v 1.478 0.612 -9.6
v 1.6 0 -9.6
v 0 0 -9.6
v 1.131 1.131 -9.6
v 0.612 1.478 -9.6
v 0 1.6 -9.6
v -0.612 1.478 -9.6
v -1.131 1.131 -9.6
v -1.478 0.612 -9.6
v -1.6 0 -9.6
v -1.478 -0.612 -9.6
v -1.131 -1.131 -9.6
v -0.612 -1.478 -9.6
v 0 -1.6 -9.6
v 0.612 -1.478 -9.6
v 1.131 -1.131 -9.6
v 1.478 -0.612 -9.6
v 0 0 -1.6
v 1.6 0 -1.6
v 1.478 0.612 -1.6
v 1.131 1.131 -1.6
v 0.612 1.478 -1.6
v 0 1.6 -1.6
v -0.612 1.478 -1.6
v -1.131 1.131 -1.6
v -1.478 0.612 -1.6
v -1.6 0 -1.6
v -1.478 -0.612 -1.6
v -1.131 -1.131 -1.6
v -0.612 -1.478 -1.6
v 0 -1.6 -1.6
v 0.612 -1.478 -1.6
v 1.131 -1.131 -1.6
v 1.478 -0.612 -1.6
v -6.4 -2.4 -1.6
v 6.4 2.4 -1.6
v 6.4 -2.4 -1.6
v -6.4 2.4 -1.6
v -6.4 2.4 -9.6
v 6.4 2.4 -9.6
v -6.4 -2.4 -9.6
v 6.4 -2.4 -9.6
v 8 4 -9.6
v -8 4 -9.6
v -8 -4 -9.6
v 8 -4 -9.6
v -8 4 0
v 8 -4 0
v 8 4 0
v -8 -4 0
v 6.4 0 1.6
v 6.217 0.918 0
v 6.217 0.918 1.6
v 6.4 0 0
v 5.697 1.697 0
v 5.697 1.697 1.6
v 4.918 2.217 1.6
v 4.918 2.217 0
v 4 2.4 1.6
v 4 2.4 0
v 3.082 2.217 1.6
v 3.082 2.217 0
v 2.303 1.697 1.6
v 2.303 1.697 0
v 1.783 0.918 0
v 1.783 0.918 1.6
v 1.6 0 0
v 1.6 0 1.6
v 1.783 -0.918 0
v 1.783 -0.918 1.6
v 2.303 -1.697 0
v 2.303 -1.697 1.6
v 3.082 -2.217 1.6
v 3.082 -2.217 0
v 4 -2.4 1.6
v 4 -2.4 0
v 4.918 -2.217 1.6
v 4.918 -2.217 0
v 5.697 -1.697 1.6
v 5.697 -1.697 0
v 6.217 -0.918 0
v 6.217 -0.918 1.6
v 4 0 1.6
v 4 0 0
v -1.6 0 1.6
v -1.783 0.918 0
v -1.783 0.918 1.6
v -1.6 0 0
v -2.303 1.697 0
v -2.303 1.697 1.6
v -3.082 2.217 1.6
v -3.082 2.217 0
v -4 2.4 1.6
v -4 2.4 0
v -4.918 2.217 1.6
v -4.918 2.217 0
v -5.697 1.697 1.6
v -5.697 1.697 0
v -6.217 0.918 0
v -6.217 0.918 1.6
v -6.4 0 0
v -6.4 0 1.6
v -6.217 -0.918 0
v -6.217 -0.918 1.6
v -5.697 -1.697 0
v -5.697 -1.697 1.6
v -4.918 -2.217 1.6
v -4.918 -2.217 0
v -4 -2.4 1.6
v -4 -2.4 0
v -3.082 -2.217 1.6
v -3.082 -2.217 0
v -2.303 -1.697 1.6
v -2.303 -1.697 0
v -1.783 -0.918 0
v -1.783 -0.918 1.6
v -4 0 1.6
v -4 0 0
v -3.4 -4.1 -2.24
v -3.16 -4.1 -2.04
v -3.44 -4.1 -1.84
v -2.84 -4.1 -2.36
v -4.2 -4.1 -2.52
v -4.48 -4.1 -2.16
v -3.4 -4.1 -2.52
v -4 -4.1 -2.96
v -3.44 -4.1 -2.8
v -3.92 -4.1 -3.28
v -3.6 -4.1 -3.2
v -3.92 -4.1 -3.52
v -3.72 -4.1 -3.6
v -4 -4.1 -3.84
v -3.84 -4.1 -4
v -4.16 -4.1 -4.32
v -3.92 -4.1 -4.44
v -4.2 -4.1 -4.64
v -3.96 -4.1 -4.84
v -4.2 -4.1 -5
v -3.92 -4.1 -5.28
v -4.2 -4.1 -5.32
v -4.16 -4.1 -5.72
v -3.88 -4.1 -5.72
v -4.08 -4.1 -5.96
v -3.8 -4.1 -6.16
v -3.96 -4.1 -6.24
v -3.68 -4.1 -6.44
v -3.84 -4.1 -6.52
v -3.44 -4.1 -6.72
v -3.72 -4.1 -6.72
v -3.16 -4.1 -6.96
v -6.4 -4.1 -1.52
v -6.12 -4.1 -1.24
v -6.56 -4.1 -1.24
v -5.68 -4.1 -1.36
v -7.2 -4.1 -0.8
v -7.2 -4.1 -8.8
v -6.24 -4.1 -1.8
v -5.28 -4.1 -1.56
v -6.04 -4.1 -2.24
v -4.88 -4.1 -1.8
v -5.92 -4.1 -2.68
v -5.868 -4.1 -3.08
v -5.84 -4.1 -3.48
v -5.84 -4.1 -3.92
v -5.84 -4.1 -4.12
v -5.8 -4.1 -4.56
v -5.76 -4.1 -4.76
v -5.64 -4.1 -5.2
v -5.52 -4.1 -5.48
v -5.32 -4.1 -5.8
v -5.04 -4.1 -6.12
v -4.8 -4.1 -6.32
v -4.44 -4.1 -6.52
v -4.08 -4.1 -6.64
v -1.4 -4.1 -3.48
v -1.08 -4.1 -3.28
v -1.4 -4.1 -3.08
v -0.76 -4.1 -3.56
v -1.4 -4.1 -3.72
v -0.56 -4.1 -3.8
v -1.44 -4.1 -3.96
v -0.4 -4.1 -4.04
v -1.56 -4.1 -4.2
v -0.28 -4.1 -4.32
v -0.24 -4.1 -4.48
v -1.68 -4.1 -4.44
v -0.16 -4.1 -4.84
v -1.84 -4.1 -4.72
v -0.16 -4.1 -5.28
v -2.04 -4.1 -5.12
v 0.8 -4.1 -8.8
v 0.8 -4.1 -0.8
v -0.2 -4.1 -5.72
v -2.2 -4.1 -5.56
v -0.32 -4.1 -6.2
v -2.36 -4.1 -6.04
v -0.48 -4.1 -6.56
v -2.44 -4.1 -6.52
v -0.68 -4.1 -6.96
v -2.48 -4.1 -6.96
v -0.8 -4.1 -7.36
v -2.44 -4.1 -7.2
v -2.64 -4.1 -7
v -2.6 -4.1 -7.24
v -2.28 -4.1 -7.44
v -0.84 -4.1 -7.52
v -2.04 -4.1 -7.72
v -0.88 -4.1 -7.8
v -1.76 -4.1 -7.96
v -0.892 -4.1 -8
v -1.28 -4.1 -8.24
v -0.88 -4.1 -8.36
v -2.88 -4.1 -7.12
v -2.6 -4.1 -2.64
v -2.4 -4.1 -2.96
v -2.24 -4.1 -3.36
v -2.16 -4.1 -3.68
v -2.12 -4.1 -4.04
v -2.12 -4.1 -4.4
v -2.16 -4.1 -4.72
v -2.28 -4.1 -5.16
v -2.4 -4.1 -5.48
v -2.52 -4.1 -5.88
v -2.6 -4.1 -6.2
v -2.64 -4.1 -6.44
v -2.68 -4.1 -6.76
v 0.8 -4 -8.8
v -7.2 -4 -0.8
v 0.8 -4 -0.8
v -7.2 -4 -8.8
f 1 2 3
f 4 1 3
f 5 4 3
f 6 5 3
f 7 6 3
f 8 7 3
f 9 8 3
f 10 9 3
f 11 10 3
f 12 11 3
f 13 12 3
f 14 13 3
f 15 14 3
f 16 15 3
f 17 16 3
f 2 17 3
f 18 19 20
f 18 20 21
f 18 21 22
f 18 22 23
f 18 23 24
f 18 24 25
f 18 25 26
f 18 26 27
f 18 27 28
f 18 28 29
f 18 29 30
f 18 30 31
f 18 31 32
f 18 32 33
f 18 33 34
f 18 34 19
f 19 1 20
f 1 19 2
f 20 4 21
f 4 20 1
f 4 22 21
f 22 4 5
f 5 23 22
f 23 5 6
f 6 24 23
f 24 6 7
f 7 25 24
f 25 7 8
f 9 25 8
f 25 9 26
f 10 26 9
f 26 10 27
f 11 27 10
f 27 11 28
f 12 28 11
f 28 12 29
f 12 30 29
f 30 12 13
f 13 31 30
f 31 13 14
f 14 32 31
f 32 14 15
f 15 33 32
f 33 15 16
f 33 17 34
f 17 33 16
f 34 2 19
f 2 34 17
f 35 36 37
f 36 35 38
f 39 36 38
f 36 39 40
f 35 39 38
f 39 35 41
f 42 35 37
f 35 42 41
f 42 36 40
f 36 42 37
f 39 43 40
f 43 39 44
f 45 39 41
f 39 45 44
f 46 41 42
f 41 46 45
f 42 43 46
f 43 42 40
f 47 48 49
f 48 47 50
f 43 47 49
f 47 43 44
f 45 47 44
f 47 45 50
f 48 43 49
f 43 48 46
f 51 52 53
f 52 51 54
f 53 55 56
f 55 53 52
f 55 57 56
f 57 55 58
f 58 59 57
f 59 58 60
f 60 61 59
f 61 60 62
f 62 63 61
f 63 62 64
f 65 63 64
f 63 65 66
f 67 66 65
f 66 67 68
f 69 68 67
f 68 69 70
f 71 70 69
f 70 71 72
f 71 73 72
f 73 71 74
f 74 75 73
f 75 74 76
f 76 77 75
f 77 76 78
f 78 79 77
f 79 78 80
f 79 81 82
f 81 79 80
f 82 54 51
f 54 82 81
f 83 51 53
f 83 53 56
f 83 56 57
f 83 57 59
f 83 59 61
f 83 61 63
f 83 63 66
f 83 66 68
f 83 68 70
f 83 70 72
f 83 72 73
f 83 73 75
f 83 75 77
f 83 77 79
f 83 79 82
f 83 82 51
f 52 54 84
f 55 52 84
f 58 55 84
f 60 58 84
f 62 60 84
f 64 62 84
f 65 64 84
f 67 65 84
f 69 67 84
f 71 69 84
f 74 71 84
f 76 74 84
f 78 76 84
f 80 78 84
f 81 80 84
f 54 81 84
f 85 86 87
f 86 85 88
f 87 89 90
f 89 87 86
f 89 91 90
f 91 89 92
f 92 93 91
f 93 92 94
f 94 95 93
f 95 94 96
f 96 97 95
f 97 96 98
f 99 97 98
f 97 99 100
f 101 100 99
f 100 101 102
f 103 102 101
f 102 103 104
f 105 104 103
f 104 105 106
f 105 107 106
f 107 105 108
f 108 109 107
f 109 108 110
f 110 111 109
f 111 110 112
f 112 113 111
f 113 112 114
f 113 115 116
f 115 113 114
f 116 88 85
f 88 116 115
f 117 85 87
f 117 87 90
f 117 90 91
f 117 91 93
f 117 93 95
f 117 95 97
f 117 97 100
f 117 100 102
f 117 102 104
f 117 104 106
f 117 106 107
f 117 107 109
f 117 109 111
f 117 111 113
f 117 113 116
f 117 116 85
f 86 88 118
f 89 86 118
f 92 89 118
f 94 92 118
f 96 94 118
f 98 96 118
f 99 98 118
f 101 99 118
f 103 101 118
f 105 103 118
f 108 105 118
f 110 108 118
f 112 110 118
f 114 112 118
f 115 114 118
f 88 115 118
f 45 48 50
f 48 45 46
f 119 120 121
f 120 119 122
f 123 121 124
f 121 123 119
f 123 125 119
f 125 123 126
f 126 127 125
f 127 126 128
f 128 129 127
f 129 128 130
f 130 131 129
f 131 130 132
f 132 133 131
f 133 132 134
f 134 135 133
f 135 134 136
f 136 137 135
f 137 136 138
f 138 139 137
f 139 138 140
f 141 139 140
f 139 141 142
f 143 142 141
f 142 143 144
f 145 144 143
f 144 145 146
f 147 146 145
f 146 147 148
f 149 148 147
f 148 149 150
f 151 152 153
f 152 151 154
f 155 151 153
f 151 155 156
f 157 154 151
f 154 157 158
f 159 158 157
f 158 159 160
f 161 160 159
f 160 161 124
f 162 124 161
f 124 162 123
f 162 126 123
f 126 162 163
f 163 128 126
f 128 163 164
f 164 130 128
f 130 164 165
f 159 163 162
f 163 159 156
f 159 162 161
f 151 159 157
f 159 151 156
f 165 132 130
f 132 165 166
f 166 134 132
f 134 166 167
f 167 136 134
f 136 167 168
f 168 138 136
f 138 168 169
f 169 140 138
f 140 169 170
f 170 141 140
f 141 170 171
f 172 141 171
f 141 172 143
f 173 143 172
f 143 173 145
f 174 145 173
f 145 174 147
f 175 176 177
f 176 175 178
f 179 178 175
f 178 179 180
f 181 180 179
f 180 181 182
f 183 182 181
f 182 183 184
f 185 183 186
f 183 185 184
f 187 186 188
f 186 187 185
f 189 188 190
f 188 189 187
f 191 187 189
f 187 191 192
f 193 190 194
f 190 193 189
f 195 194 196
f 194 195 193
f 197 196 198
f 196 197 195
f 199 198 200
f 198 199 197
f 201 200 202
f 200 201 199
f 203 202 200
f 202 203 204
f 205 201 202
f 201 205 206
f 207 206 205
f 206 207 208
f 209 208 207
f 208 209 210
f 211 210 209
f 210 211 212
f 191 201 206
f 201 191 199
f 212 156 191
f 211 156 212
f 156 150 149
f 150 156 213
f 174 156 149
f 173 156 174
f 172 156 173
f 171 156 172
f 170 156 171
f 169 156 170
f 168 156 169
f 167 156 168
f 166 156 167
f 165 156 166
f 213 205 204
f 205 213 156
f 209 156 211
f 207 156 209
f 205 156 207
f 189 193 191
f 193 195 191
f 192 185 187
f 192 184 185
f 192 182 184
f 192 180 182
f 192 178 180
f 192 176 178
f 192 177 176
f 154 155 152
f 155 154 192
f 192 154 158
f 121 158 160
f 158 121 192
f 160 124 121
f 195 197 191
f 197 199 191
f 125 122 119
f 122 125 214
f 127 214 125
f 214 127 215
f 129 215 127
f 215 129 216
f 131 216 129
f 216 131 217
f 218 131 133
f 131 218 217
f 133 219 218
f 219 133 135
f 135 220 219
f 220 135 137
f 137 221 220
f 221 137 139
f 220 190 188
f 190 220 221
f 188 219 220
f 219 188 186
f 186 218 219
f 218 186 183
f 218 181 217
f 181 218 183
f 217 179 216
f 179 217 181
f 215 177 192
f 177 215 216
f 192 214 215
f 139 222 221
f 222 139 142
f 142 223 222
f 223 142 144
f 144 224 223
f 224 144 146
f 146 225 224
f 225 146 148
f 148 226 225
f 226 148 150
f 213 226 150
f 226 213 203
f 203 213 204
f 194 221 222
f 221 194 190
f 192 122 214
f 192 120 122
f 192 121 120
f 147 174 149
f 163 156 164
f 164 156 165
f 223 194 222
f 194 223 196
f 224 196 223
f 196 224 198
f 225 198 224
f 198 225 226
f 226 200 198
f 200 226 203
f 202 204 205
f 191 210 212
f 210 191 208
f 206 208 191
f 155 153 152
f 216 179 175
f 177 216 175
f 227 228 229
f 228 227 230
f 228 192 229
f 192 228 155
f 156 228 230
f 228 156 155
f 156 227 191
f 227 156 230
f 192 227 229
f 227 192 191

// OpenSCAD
// file: ../p/4-4edge.scad
use <../lib.scad>
function ldraw_lib__4_4edge() = [
// 0 Circle 1.0
// 0 Name: 4-4edge.dat
// 0 Author: James Jessiman
// 0 !LDRAW_ORG Primitive UPDATE 2017-01
// 0 !LICENSE Licensed under CC BY 2.0 and CC BY 4.0 : see CAreadme.txt
// 
// 0 BFC CERTIFY CCW
  [0,"BFC","CERTIFY"],
  [0,"BFC","CCW"],
// 
// 0 !HISTORY 1998-12-15 [PTadmin] Official Update 1998-10
// 0 !HISTORY 2005-12-28 [PTadmin] Official Update 2005-01
// 0 !HISTORY 2007-06-24 [PTadmin] Header formatted for Contributor Agreement
// 0 !HISTORY 2008-07-01 [PTadmin] Official Update 2008-01
// 0 !HISTORY 2017-01-15 [Steffen] BFCed
// 0 !HISTORY 2017-12-30 [PTadmin] Official Update 2017-01
// 
// 
// 2 24 1 0 0 0.9239 0 0.3827
  [2,24,1,0,0,0.9239,0,0.3827],
// 2 24 0.9239 0 0.3827 0.7071 0 0.7071
  [2,24,0.9239,0,0.3827,0.7071,0,0.7071],
// 2 24 0.7071 0 0.7071 0.3827 0 0.9239
  [2,24,0.7071,0,0.7071,0.3827,0,0.9239],
// 2 24 0.3827 0 0.9239 0 0 1
  [2,24,0.3827,0,0.9239,0,0,1],
// 2 24 0 0 1 -0.3827 0 0.9239
  [2,24,0,0,1,-0.3827,0,0.9239],
// 2 24 -0.3827 0 0.9239 -0.7071 0 0.7071
  [2,24,-0.3827,0,0.9239,-0.7071,0,0.7071],
// 2 24 -0.7071 0 0.7071 -0.9239 0 0.3827
  [2,24,-0.7071,0,0.7071,-0.9239,0,0.3827],
// 2 24 -0.9239 0 0.3827 -1 0 -0
  [2,24,-0.9239,0,0.3827,-1,0,-0],
// 2 24 -1 0 -0 -0.9239 0 -0.3827
  [2,24,-1,0,-0,-0.9239,0,-0.3827],
// 2 24 -0.9239 0 -0.3827 -0.7071 0 -0.7071
  [2,24,-0.9239,0,-0.3827,-0.7071,0,-0.7071],
// 2 24 -0.7071 0 -0.7071 -0.3827 0 -0.9239
  [2,24,-0.7071,0,-0.7071,-0.3827,0,-0.9239],
// 2 24 -0.3827 0 -0.9239 0 0 -1
  [2,24,-0.3827,0,-0.9239,0,0,-1],
// 2 24 0 0 -1 0.3827 0 -0.9239
  [2,24,0,0,-1,0.3827,0,-0.9239],
// 2 24 0.3827 0 -0.9239 0.7071 0 -0.7071
  [2,24,0.3827,0,-0.9239,0.7071,0,-0.7071],
// 2 24 0.7071 0 -0.7071 0.9239 0 -0.3827
  [2,24,0.7071,0,-0.7071,0.9239,0,-0.3827],
// 2 24 0.9239 0 -0.3827 1 0 0
  [2,24,0.9239,0,-0.3827,1,0,0],
];
module ldraw_lib__4_4edge(step=0, col=false, unit=2/5, alt=false, line=0.2, solid=!$preview)
    makepoly(ldraw_lib__4_4edge(), step=step, col=col, unit=unit, alt=alt, line=line, solid=solid);
ldraw_lib__4_4edge(line=0.2);
// file: ../p/4-4disc.scad
use <../lib.scad>
function ldraw_lib__4_4disc() = [
// 0 Disc 1.0
// 0 Name: 4-4disc.dat
// 0 Author: James Jessiman
// 0 !LDRAW_ORG Primitive UPDATE 2002-02
// 0 !LICENSE Licensed under CC BY 2.0 and CC BY 4.0 : see CAreadme.txt
// 
// 0 BFC CERTIFY CCW
  [0,"BFC","CERTIFY"],
  [0,"BFC","CCW"],
// 
// 0 !HISTORY 1998-12-15 [PTadmin] Official Update 1998-10
// 0 !HISTORY 2002-03-23 [sbliss] Added BFC statement
// 0 !HISTORY 2002-04-25 [PTadmin] Official Update 2002-02
// 0 !HISTORY 2007-06-24 [PTadmin] Header formatted for Contributor Agreement
// 0 !HISTORY 2008-07-01 [PTadmin] Official Update 2008-01
// 
// 
// 3 16 0 0 0 1 0 0 0.9239 0 0.3827
  [3,16,0,0,0,1,0,0,0.9239,0,0.3827],
// 3 16 0 0 0 0.9239 0 0.3827 0.7071 0 0.7071
  [3,16,0,0,0,0.9239,0,0.3827,0.7071,0,0.7071],
// 3 16 0 0 0 0.7071 0 0.7071 0.3827 0 0.9239
  [3,16,0,0,0,0.7071,0,0.7071,0.3827,0,0.9239],
// 3 16 0 0 0 0.3827 0 0.9239 0 0 1
  [3,16,0,0,0,0.3827,0,0.9239,0,0,1],
// 3 16 0 0 0 0 0 1 -0.3827 0 0.9239
  [3,16,0,0,0,0,0,1,-0.3827,0,0.9239],
// 3 16 0 0 0 -0.3827 0 0.9239 -0.7071 0 0.7071
  [3,16,0,0,0,-0.3827,0,0.9239,-0.7071,0,0.7071],
// 3 16 0 0 0 -0.7071 0 0.7071 -0.9239 0 0.3827
  [3,16,0,0,0,-0.7071,0,0.7071,-0.9239,0,0.3827],
// 3 16 0 0 0 -0.9239 0 0.3827 -1 0 -0
  [3,16,0,0,0,-0.9239,0,0.3827,-1,0,-0],
// 3 16 0 0 0 -1 0 -0 -0.9239 0 -0.3827
  [3,16,0,0,0,-1,0,-0,-0.9239,0,-0.3827],
// 3 16 0 0 0 -0.9239 0 -0.3827 -0.7071 0 -0.7071
  [3,16,0,0,0,-0.9239,0,-0.3827,-0.7071,0,-0.7071],
// 3 16 0 0 0 -0.7071 0 -0.7071 -0.3827 0 -0.9239
  [3,16,0,0,0,-0.7071,0,-0.7071,-0.3827,0,-0.9239],
// 3 16 0 0 0 -0.3827 0 -0.9239 0 0 -1
  [3,16,0,0,0,-0.3827,0,-0.9239,0,0,-1],
// 3 16 0 0 0 0 0 -1 0.3827 0 -0.9239
  [3,16,0,0,0,0,0,-1,0.3827,0,-0.9239],
// 3 16 0 0 0 0.3827 0 -0.9239 0.7071 0 -0.7071
  [3,16,0,0,0,0.3827,0,-0.9239,0.7071,0,-0.7071],
// 3 16 0 0 0 0.7071 0 -0.7071 0.9239 0 -0.3827
  [3,16,0,0,0,0.7071,0,-0.7071,0.9239,0,-0.3827],
// 3 16 0 0 0 0.9239 0 -0.3827 1 0 0
  [3,16,0,0,0,0.9239,0,-0.3827,1,0,0],
// 0
];
module ldraw_lib__4_4disc(step=0, col=false, unit=2/5, alt=false, line=0.2, solid=!$preview)
    makepoly(ldraw_lib__4_4disc(), step=step, col=col, unit=unit, alt=alt, line=line, solid=solid);
ldraw_lib__4_4disc(line=0.2);
// file: ../p/4-4cyli.scad
use <../lib.scad>
$fa=1; $fs=0.2;
function ldraw_lib__4_4cyli(realsolid=false) = [
// 0 Cylinder 1.0
// 0 Name: 4-4cyli.dat
// 0 Author: James Jessiman
// 0 !LDRAW_ORG Primitive UPDATE 2005-01
// 0 !LICENSE Licensed under CC BY 2.0 and CC BY 4.0 : see CAreadme.txt
// 
// 0 BFC CERTIFY CCW
  [0,"BFC","CERTIFY"],
  [0,"BFC","CCW"],
// 
// 0 !HISTORY 1998-12-15 [PTadmin] Official Update 1998-10
// 0 !HISTORY 2002-03-23 [sbliss] Added BFC statement; merged headers from files in distributions LDraw 0.27 and Complete.
// 0 !HISTORY 2002-04-25 [PTadmin] Official Update 2002-02
// 0 !HISTORY 2004-12-14 [guyvivan] BFC CCW
// 0 !HISTORY 2005-12-28 [PTadmin] Official Update 2005-01
// 0 !HISTORY 2007-06-24 [PTadmin] Header formatted for Contributor Agreement
// 0 !HISTORY 2008-07-01 [PTadmin] Official Update 2008-01
// 
// 
// 4 16 1 1 0 0.9239 1 0.3827 0.9239 0 0.3827 1 0 0
  [4,16,1,1,0,0.9239,1,0.3827,0.9239,0,0.3827,1,0,0],
// 5 24 1 0 0 1 1 0 0.9239 0 0.3827 0.9239 0 -0.3827
  [5,24,1,0,0,1,1,0,0.9239,0,0.3827,0.9239,0,-0.3827],
// 4 16 0.9239 1 0.3827 0.7071 1 0.7071 0.7071 0 0.7071 0.9239 0 0.3827
  [4,16,0.9239,1,0.3827,0.7071,1,0.7071,0.7071,0,0.7071,0.9239,0,0.3827],
// 5 24 0.9239 0 0.3827 0.9239 1 0.3827 0.7071 0 0.7071 1 0 0
  [5,24,0.9239,0,0.3827,0.9239,1,0.3827,0.7071,0,0.7071,1,0,0],
// 4 16 0.7071 1 0.7071 0.3827 1 0.9239 0.3827 0 0.9239 0.7071 0 0.7071
  [4,16,0.7071,1,0.7071,0.3827,1,0.9239,0.3827,0,0.9239,0.7071,0,0.7071],
// 5 24 0.7071 0 0.7071 0.7071 1 0.7071 0.3827 0 0.9239 0.9239 0 0.3827
  [5,24,0.7071,0,0.7071,0.7071,1,0.7071,0.3827,0,0.9239,0.9239,0,0.3827],
// 4 16 0.3827 1 0.9239 0 1 1 0 0 1 0.3827 0 0.9239
  [4,16,0.3827,1,0.9239,0,1,1,0,0,1,0.3827,0,0.9239],
// 5 24 0.3827 0 0.9239 0.3827 1 0.9239 0 0 1 0.7071 0 0.7071
  [5,24,0.3827,0,0.9239,0.3827,1,0.9239,0,0,1,0.7071,0,0.7071],
// 4 16 0 1 1 -0.3827 1 0.9239 -0.3827 0 0.9239 0 0 1
  [4,16,0,1,1,-0.3827,1,0.9239,-0.3827,0,0.9239,0,0,1],
// 5 24 0 0 1 0 1 1 -0.3827 0 0.9239 0.3827 0 0.9239
  [5,24,0,0,1,0,1,1,-0.3827,0,0.9239,0.3827,0,0.9239],
// 4 16 -0.3827 1 0.9239 -0.7071 1 0.7071 -0.7071 0 0.7071 -0.3827 0 0.9239
  [4,16,-0.3827,1,0.9239,-0.7071,1,0.7071,-0.7071,0,0.7071,-0.3827,0,0.9239],
// 5 24 -0.3827 0 0.9239 -0.3827 1 0.9239 -0.7071 0 0.7071 0 0 1
  [5,24,-0.3827,0,0.9239,-0.3827,1,0.9239,-0.7071,0,0.7071,0,0,1],
// 4 16 -0.7071 1 0.7071 -0.9239 1 0.3827 -0.9239 0 0.3827 -0.7071 0 0.7071
  [4,16,-0.7071,1,0.7071,-0.9239,1,0.3827,-0.9239,0,0.3827,-0.7071,0,0.7071],
// 5 24 -0.7071 0 0.7071 -0.7071 1 0.7071 -0.9239 0 0.3827 -0.3827 0 0.9239
  [5,24,-0.7071,0,0.7071,-0.7071,1,0.7071,-0.9239,0,0.3827,-0.3827,0,0.9239],
// 4 16 -0.9239 1 0.3827 -1 1 0 -1 0 0 -0.9239 0 0.3827
  [4,16,-0.9239,1,0.3827,-1,1,0,-1,0,0,-0.9239,0,0.3827],
// 5 24 -0.9239 0 0.3827 -0.9239 1 0.3827 -1 0 0 -0.7071 0 0.7071
  [5,24,-0.9239,0,0.3827,-0.9239,1,0.3827,-1,0,0,-0.7071,0,0.7071],
// 4 16 -1 1 0 -0.9239 1 -0.3827 -0.9239 0 -0.3827 -1 0 0
  [4,16,-1,1,0,-0.9239,1,-0.3827,-0.9239,0,-0.3827,-1,0,0],
// 5 24 -1 0 0 -1 1 0 -0.9239 0 -0.3827 -0.9239 0 0.3827
  [5,24,-1,0,0,-1,1,0,-0.9239,0,-0.3827,-0.9239,0,0.3827],
// 4 16 -0.9239 1 -0.3827 -0.7071 1 -0.7071 -0.7071 0 -0.7071 -0.9239 0 -0.3827
  [4,16,-0.9239,1,-0.3827,-0.7071,1,-0.7071,-0.7071,0,-0.7071,-0.9239,0,-0.3827],
// 5 24 -0.9239 0 -0.3827 -0.9239 1 -0.3827 -0.7071 0 -0.7071 -1 0 0
  [5,24,-0.9239,0,-0.3827,-0.9239,1,-0.3827,-0.7071,0,-0.7071,-1,0,0],
// 4 16 -0.7071 1 -0.7071 -0.3827 1 -0.9239 -0.3827 0 -0.9239 -0.7071 0 -0.7071
  [4,16,-0.7071,1,-0.7071,-0.3827,1,-0.9239,-0.3827,0,-0.9239,-0.7071,0,-0.7071],
// 5 24 -0.7071 0 -0.7071 -0.7071 1 -0.7071 -0.3827 0 -0.9239 -0.9239 0 -0.3827
  [5,24,-0.7071,0,-0.7071,-0.7071,1,-0.7071,-0.3827,0,-0.9239,-0.9239,0,-0.3827],
// 4 16 -0.3827 1 -0.9239 0 1 -1 0 0 -1 -0.3827 0 -0.9239
  [4,16,-0.3827,1,-0.9239,0,1,-1,0,0,-1,-0.3827,0,-0.9239],
// 5 24 -0.3827 0 -0.9239 -0.3827 1 -0.9239 0 0 -1 -0.7071 0 -0.7071
  [5,24,-0.3827,0,-0.9239,-0.3827,1,-0.9239,0,0,-1,-0.7071,0,-0.7071],
// 4 16 0 1 -1 0.3827 1 -0.9239 0.3827 0 -0.9239 0 0 -1
  [4,16,0,1,-1,0.3827,1,-0.9239,0.3827,0,-0.9239,0,0,-1],
// 5 24 0 0 -1 0 1 -1 0.3827 0 -0.9239 -0.3827 0 -0.9239
  [5,24,0,0,-1,0,1,-1,0.3827,0,-0.9239,-0.3827,0,-0.9239],
// 4 16 0.3827 1 -0.9239 0.7071 1 -0.7071 0.7071 0 -0.7071 0.3827 0 -0.9239
  [4,16,0.3827,1,-0.9239,0.7071,1,-0.7071,0.7071,0,-0.7071,0.3827,0,-0.9239],
// 5 24 0.3827 0 -0.9239 0.3827 1 -0.9239 0.7071 0 -0.7071 0 0 -1
  [5,24,0.3827,0,-0.9239,0.3827,1,-0.9239,0.7071,0,-0.7071,0,0,-1],
// 4 16 0.7071 1 -0.7071 0.9239 1 -0.3827 0.9239 0 -0.3827 0.7071 0 -0.7071
  [4,16,0.7071,1,-0.7071,0.9239,1,-0.3827,0.9239,0,-0.3827,0.7071,0,-0.7071],
// 5 24 0.7071 0 -0.7071 0.7071 1 -0.7071 0.9239 0 -0.3827 0.3827 0 -0.9239
  [5,24,0.7071,0,-0.7071,0.7071,1,-0.7071,0.9239,0,-0.3827,0.3827,0,-0.9239],
// 4 16 0.9239 1 -0.3827 1 1 0 1 0 0 0.9239 0 -0.3827
  [4,16,0.9239,1,-0.3827,1,1,0,1,0,0,0.9239,0,-0.3827],
// 5 24 0.9239 0 -0.3827 0.9239 1 -0.3827 1 0 0 0.7071 0 -0.7071
  [5,24,0.9239,0,-0.3827,0.9239,1,-0.3827,1,0,0,0.7071,0,-0.7071],
// 0
];
module ldraw_lib__4_4cyli(step=0, col=false, unit=2/5, alt=false, line=0.2, solid=!$preview)
    makepoly(ldraw_lib__4_4cyli(solid), step=step, col=col, unit=unit, alt=alt, line=line, solid=solid);
ldraw_lib__4_4cyli(line=0.2);
// file: ../p/stud3.scad
use <../lib.scad>
use <4-4cyli.scad>
use <4-4disc.scad>
use <4-4edge.scad>
function ldraw_lib__stud3() = [
// 0 Stud Tube Solid
// 0 Name: stud3.dat
// 0 Author: James Jessiman
// 0 !LDRAW_ORG Primitive UPDATE 2012-01
// 0 !LICENSE Licensed under CC BY 4.0 : see CAreadme.txt
// 
// 0 BFC CERTIFY CCW
  [0,"BFC","CERTIFY"],
  [0,"BFC","CCW"],
// 
// 0 !HISTORY 2002-04-04 [sbliss] Modified for BFC compliance
// 0 !HISTORY 2002-04-25 [PTadmin] Official Update 2002-02
// 0 !HISTORY 2007-06-24 [PTadmin] Header formatted for Contributor Agreement
// 0 !HISTORY 2008-07-01 [PTadmin] Official Update 2008-01
// 0 !HISTORY 2012-02-16 [Philo] Changed to CCW
// 0 !HISTORY 2012-03-30 [PTadmin] Official Update 2012-01
// 
// 
// 1 16 0 -4 0 4 0 0 0 1 0 0 0 4 4-4edge.dat
  [1,16,0,-4,0,4,0,0,0,1,0,0,0,4, ldraw_lib__4_4edge()],
// 1 16 0 0 0 4 0 0 0 1 0 0 0 4 4-4edge.dat
  [1,16,0,0,0,4,0,0,0,1,0,0,0,4, ldraw_lib__4_4edge()],
// 1 16 0 -4 0 4 0 0 0 1 0 0 0 4 4-4disc.dat
  [1,16,0,-4,0,4,0,0,0,1,0,0,0,4, ldraw_lib__4_4disc()],
  [-1,16,0,0,0,4,0,0,0,-1,0,0,0,4, ldraw_lib__4_4disc()],
// 1 16 0 -4 0 4 0 0 0 4 0 0 0 4 4-4cyli.dat
  [1,16,0,-4,0,4,0,0,0,4,0,0,0,4, ldraw_lib__4_4cyli()],
];
module ldraw_lib__stud3(step=0, col=false, unit=2/5, alt=false, line=0.2, solid=!$preview)
    makepoly(ldraw_lib__stud3(), step=step, col=col, unit=unit, alt=alt, line=line, solid=solid);
ldraw_lib__stud3(line=0.2);
// file: ../p/stud.scad
use <../lib.scad>
use <4-4cyli.scad>
use <4-4disc.scad>
use <4-4edge.scad>
function ldraw_lib__stud() = [
// 0 Stud
// 0 Name: stud.dat
// 0 Author: James Jessiman
// 0 !LDRAW_ORG Primitive UPDATE 2012-01
// 0 !LICENSE Licensed under CC BY 4.0 : see CAreadme.txt
// 
// 0 BFC CERTIFY CCW
  [0,"BFC","CERTIFY"],
  [0,"BFC","CCW"],
// 
// 0 !HISTORY 2002-04-04 [sbliss] Modified for BFC compliance
// 0 !HISTORY 2002-04-25 [PTadmin] Official Update 2002-02
// 0 !HISTORY 2007-06-24 [PTadmin] Header formatted for Contributor Agreement
// 0 !HISTORY 2008-07-01 [PTadmin] Official Update 2008-01
// 0 !HISTORY 2012-02-16 [Philo] Changed to CCW
// 0 !HISTORY 2012-03-30 [PTadmin] Official Update 2012-01
// 
// 
// 1 16 0 0 0 6 0 0 0 1 0 0 0 6 4-4edge.dat
  [1,16,0,0,0,6,0,0,0,1,0,0,0,6, ldraw_lib__4_4edge()],
// 1 16 0 -4 0 6 0 0 0 1 0 0 0 6 4-4edge.dat
  [1,16,0,-4,0,6,0,0,0,1,0,0,0,6, ldraw_lib__4_4edge()],
// 1 16 0 0 0 6 0 0 0 -4 0 0 0 6 4-4cyli.dat
  [1,16,0,0,0,6,0,0,0,-4,0,0,0,6, ldraw_lib__4_4cyli()],
// 1 16 0 -4 0 6 0 0 0 1 0 0 0 6 4-4disc.dat
  [1,16,0,-4,0,6,0,0,0,1,0,0,0,6, ldraw_lib__4_4disc()],
  [-1,16,0,0,0,6,0,0,0,-1,0,0,0,6, ldraw_lib__4_4disc()],
];
module ldraw_lib__stud(step=0, col=false, unit=2/5, alt=false, line=0.2, solid=!$preview)
    makepoly(ldraw_lib__stud(), step=step, col=col, unit=unit, alt=alt, line=line, solid=solid);
ldraw_lib__stud(line=0.2);
// file: ../p/box5.scad
use <../lib.scad>
function ldraw_lib__box5() = [
// 0 Box with 5 Faces and All Edges
// 0 Name: box5.dat
// 0 Author: James Jessiman
// 0 !LDRAW_ORG Primitive UPDATE 2012-01
// 0 !LICENSE Licensed under CC BY 2.0 and CC BY 4.0 : see CAreadme.txt
// 
// 0 BFC CERTIFY CCW
  [0,"BFC","CERTIFY"],
  [0,"BFC","CCW"],
// 
// 0 !HISTORY 2002-04-03 [sbliss] Modified for BFC compliance
// 0 !HISTORY 2002-04-25 [PTadmin] Official Update 2002-02
// 0 !HISTORY 2007-06-24 [PTadmin] Header formatted for Contributor Agreement
// 0 !HISTORY 2008-07-01 [PTadmin] Official Update 2008-01
// 0 !HISTORY 2012-02-16 [Philo] Changed to CCW
// 0 !HISTORY 2012-03-30 [PTadmin] Official Update 2012-01
// 
// 
// 2 24 1 1 1 -1 1 1
  [2,24,1,1,1,-1,1,1],
// 2 24 -1 1 1 -1 1 -1
  [2,24,-1,1,1,-1,1,-1],
// 2 24 -1 1 -1 1 1 -1
  [2,24,-1,1,-1,1,1,-1],
// 2 24 1 1 -1 1 1 1
  [2,24,1,1,-1,1,1,1],
// 2 24 1 0 1 -1 0 1
  [2,24,1,0,1,-1,0,1],
// 2 24 -1 0 1 -1 0 -1
  [2,24,-1,0,1,-1,0,-1],
// 2 24 -1 0 -1 1 0 -1
  [2,24,-1,0,-1,1,0,-1],
// 2 24 1 0 -1 1 0 1
  [2,24,1,0,-1,1,0,1],
// 2 24 1 0 1 1 1 1
  [2,24,1,0,1,1,1,1],
// 2 24 -1 0 1 -1 1 1
  [2,24,-1,0,1,-1,1,1],
// 2 24 1 0 -1 1 1 -1
  [2,24,1,0,-1,1,1,-1],
// 2 24 -1 0 -1 -1 1 -1
  [2,24,-1,0,-1,-1,1,-1],
// 4 16 -1 1 1 1 1 1 1 1 -1 -1 1 -1
  [4,16,-1,1,1,1,1,1,1,1,-1,-1,1,-1],
// 4 16 -1 1 1 -1 0 1 1 0 1 1 1 1
  [4,16,-1,1,1,-1,0,1,1,0,1,1,1,1],
// 4 16 -1 1 -1 -1 0 -1 -1 0 1 -1 1 1
  [4,16,-1,1,-1,-1,0,-1,-1,0,1,-1,1,1],
// 4 16 1 1 -1 1 0 -1 -1 0 -1 -1 1 -1
  [4,16,1,1,-1,1,0,-1,-1,0,-1,-1,1,-1],
// 4 16 1 1 1 1 0 1 1 0 -1 1 1 -1
  [4,16,1,1,1,1,0,1,1,0,-1,1,1,-1],
];
makepoly(ldraw_lib__box5(), line=0.2);
// file: ../p/box4t.scad
use <../lib.scad>
function ldraw_lib__box4t() = [
// 0 Box with 4 Adjacent Faces and All Edges
// 0 Name: box4t.dat
// 0 Author: Tore Eriksson [Tore_Eriksson]
// 0 !LDRAW_ORG Primitive UPDATE 2003-02
// 0 !LICENSE Licensed under CC BY 2.0 and CC BY 4.0 : see CAreadme.txt
// 
// 0 BFC CERTIFY CCW
  [0,"BFC","CERTIFY"],
  [0,"BFC","CCW"],
// 
// 0 !HISTORY 1997-09-29 [PTadmin] Official Update 1997-15
// 0 !HISTORY 2002-08-31 [izanette] Modified with WINDZ for BFC compliance
// 0 !HISTORY 2003-08-01 [PTadmin] Official Update 2003-02
// 0 !HISTORY 2007-06-24 [PTadmin] Header formatted for Contributor Agreement
// 0 !HISTORY 2008-07-01 [PTadmin] Official Update 2008-01
// 
// 
// 2 24 1 1 1 -1 1 1
  [2,24,1,1,1,-1,1,1],
// 2 24 -1 1 1 -1 1 -1
  [2,24,-1,1,1,-1,1,-1],
// 2 24 -1 1 -1 1 1 -1
  [2,24,-1,1,-1,1,1,-1],
// 2 24 1 1 -1 1 1 1
  [2,24,1,1,-1,1,1,1],
// 2 24 1 0 1 -1 0 1
  [2,24,1,0,1,-1,0,1],
// 2 24 -1 0 1 -1 0 -1
  [2,24,-1,0,1,-1,0,-1],
// 2 24 -1 0 -1 1 0 -1
  [2,24,-1,0,-1,1,0,-1],
// 2 24 1 0 -1 1 0 1
  [2,24,1,0,-1,1,0,1],
// 2 24 1 0 1 1 1 1
  [2,24,1,0,1,1,1,1],
// 2 24 -1 0 1 -1 1 1
  [2,24,-1,0,1,-1,1,1],
// 2 24 1 0 -1 1 1 -1
  [2,24,1,0,-1,1,1,-1],
// 2 24 -1 0 -1 -1 1 -1
  [2,24,-1,0,-1,-1,1,-1],
// 4 16 1 1 1 1 1 -1 -1 1 -1 -1 1 1
  [4,16,1,1,1,1,1,-1,-1,1,-1,-1,1,1],
// 4 16 1 1 1 -1 1 1 -1 0 1 1 0 1
  [4,16,1,1,1,-1,1,1,-1,0,1,1,0,1],
// 4 16 -1 1 1 -1 1 -1 -1 0 -1 -1 0 1
  [4,16,-1,1,1,-1,1,-1,-1,0,-1,-1,0,1],
// 0 4 16 -1 1 -1 -1 0 -1 1 0 -1 1 1 -1
// 4 16 1 1 -1 1 1 1 1 0 1 1 0 -1
  [4,16,1,1,-1,1,1,1,1,0,1,1,0,-1],
// 0
];
makepoly(ldraw_lib__box4t(), line=0.2);
// file: ../p/box5-12.scad
use <../lib.scad>
function ldraw_lib__box5_12() = [
// 0 Box with 5 Faces without Any Edges
// 0 Name: box5-12.dat
// 0 Author: Chris Dee [cwdee]
// 0 !LDRAW_ORG Primitive UPDATE 2009-02
// 0 !LICENSE Licensed under CC BY 2.0 and CC BY 4.0 : see CAreadme.txt
// 
// 0 BFC CERTIFY CCW
  [0,"BFC","CERTIFY"],
  [0,"BFC","CCW"],
// 
// 0 !HISTORY 2009-09-03 [PTadmin] Official Update 2009-02
// 
// 
// 4 16 1 1 1 1 1 -1 -1 1 -1 -1 1 1
  [4,16,1,1,1,1,1,-1,-1,1,-1,-1,1,1],
// 4 16 -1 0 1 1 0 1 1 1 1 -1 1 1
  [4,16,-1,0,1,1,0,1,1,1,1,-1,1,1],
// 4 16 -1 0 -1 -1 0 1 -1 1 1 -1 1 -1
  [4,16,-1,0,-1,-1,0,1,-1,1,1,-1,1,-1],
// 4 16 1 0 -1 -1 0 -1 -1 1 -1 1 1 -1
  [4,16,1,0,-1,-1,0,-1,-1,1,-1,1,1,-1],
// 4 16 1 0 1 1 0 -1 1 1 -1 1 1 1
  [4,16,1,0,1,1,0,-1,1,1,-1,1,1,1],
// 0
];
module ldraw_lib__box5_12(step=0, col=false, unit=2/5, alt=false, line=0.2, solid=!$preview)
    makepoly(ldraw_lib__box5_12(), step=step, col=col, unit=unit, alt=alt, line=line, solid=solid);
ldraw_lib__box5_12(line=0.2);
// file: s/3004s01.scad
use <../../lib.scad>
use <../../p/box4t.scad>
use <../../p/box5.scad>
use <../../p/stud.scad>
use <../../p/stud3.scad>
$fa=1; $fs=0.2;
function ldraw_lib__s__3004s01(realsolid=false) = [
// 0 ~Brick  1 x  2 without Front Face
// 0 Name: s\3004s01.dat
// 0 Author: James Jessiman
// 0 !LDRAW_ORG Subpart UPDATE 2003-03
// 0 !LICENSE Licensed under CC BY 2.0 and CC BY 4.0 : see CAreadme.txt
// 
// 0 BFC CERTIFY CCW
  [0,"BFC","CERTIFY"],
  [0,"BFC","CCW"],
// 
// 0 !HISTORY 2003-09-07 [jriley] Subfiling, BFC
// 0 !HISTORY 2003-12-19 [PTadmin] Official Update 2003-03
// 0 !HISTORY 2007-08-29 [PTadmin] Header formatted for Contributor Agreement
// 0 !HISTORY 2008-07-01 [PTadmin] Official Update 2008-01
// 
// 
// 1 16 0 4 0 1 0 0 0 -5 0 0 0 1 stud3.dat
  [1,16,0,4,0,1,0,0,0,-5,0,0,0,1, ldraw_lib__stud3(realsolid)],
// 0 BFC INVERTNEXT
  [0,"BFC","INVERTNEXT"],
// 1 16 0 24 0 16 0 0 0 -20 0 0 0 6 box5.dat
  [1,16,0,24,0,16,0,0,0,-20,0,0,0,6, ldraw_lib__box5(realsolid)],
// 4 16 20 24 10 16 24 6 -16 24 6 -20 24 10
  [4,16,20,24,10,16,24,6,-16,24,6,-20,24,10],
// 4 16 -20 24 10 -16 24 6 -16 24 -6 -20 24 -10
  [4,16,-20,24,10,-16,24,6,-16,24,-6,-20,24,-10],
// 4 16 -20 24 -10 -16 24 -6 16 24 -6 20 24 -10
  [4,16,-20,24,-10,-16,24,-6,16,24,-6,20,24,-10],
// 4 16 20 24 -10 16 24 -6 16 24 6 20 24 10
  [4,16,20,24,-10,16,24,-6,16,24,6,20,24,10],
// 1 16 0 24 0 20 0 0 0 -24 0 0 0 10 box4t.dat
  [1,16,0,24,0,20,0,0,0,-24,0,0,0,10, ldraw_lib__box4t(realsolid)],
// 1 16 10 0 0 1 0 0 0 1 0 0 0 1 stud.dat
  [1,16,10,0,0,1,0,0,0,1,0,0,0,1, ldraw_lib__stud(realsolid)],
// 1 16 -10 0 0 1 0 0 0 1 0 0 0 1 stud.dat
  [1,16,-10,0,0,1,0,0,0,1,0,0,0,1, ldraw_lib__stud(realsolid)],
// 0
];
module ldraw_lib__s__3004s01(step=0, col=false, unit=2/5, alt=false, line=0.2, solid=!$preview)
    makepoly(ldraw_lib__s__3004s01(solid), step=step, col=col, unit=unit, alt=alt, line=line, solid=solid);
ldraw_lib__s__3004s01(line=0.2);
// file: 004659a.scad
use <../lib.scad>
use <../p/box5-12.scad>
use <s/004659as01.scad>
function ldraw_lib__004659a() = [
// 0 Sticker  1 x  1 Fire Emblem
// 0 Name: 004659a.dat
// 0 Author: Alex Taylor [anathema]
// 0 !LDRAW_ORG Part UPDATE 2013-01
// 0 !LICENSE Licensed under CC BY 4.0 : see CAreadme.txt
// 
// 0 BFC CERTIFY CCW
  [0,"BFC","CERTIFY"],
  [0,"BFC","CCW"],
// 
// 0 !HISTORY 2013-03-17 [MagFors] Used box primitive
// 0 !HISTORY 2013-07-21 [PTadmin] Official Update 2013-01
// 
// 
// 1 16 0 -0.25 0 1 0 0 0 1 0 0 0 1 s\004659as01.dat
  [1,16,0,-0.25,0,1,0,0,0,1,0,0,0,1, ldraw_lib__s__004659as01()],
// 1 16 0 -0.25 0 10 0 0 0 0.25 0 0 0 10 box5-12.dat
  [1,16,0,-0.25,0,10,0,0,0,0.25,0,0,0,10, ldraw_lib__box5_12()],
];
module ldraw_lib__004659a(step=0, col=false, unit=2/5, alt=false, line=0.2, solid=!$preview)
    makepoly(ldraw_lib__004659a(), step=step, col=col, unit=unit, alt=alt, line=line, solid=solid);
ldraw_lib__004659a(line=0.2);
// file: 3004.scad
use <../lib.scad>
use <s/3004s01.scad>
function ldraw_lib__3004() = [
// 0 Brick  1 x  2
// 0 Name: 3004.dat
// 0 Author: James Jessiman
// 0 !LDRAW_ORG Part UPDATE 2022-05
// 0 !LICENSE Licensed under CC BY 2.0 and CC BY 4.0 : see CAreadme.txt
// 
// 0 BFC CERTIFY CCW
  [0,"BFC","CERTIFY"],
  [0,"BFC","CCW"],
// 
// 0 !HISTORY 2001-10-26 [PTadmin] Official Update 2001-01
// 0 !HISTORY 2002-05-07 {unknown} BFC Certification
// 0 !HISTORY 2002-06-11 [PTadmin] Official Update 2002-03
// 0 !HISTORY 2007-05-07 [PTadmin] Header formatted for Contributor Agreement
// 0 !HISTORY 2008-07-01 [PTadmin] Official Update 2008-01
// 0 !HISTORY 2022-08-04 [MagFors] Using subfile
// 0 !HISTORY 2022-09-15 [PTadmin] Official Update 2022-05
// 
// 
// 1 16 0 0 0 1 0 0 0 1 0 0 0 1 s\3004s01.dat
  [1,16,0,0,0,1,0,0,0,1,0,0,0,1, ldraw_lib__s__3004s01()],
// 4 16 -20 24 -10 20 24 -10 20 0 -10 -20 0 -10
  [4,16,-20,24,-10,20,24,-10,20,0,-10,-20,0,-10],
];
module ldraw_lib__3004(step=0, col=false, unit=2/5, alt=false, line=0.2, solid=!$preview)
    makepoly(ldraw_lib__3004(), step=step, col=col, unit=unit, alt=alt, line=line, solid=solid);
ldraw_lib__3004(line=0.2);
// file: 004608b.scad
use <../lib.scad>
use <004659a.scad>
function ldraw_lib__004608b() = [
// 0 =Sticker  1 x  1 Fire Emblem
// 0 Name: 004608b.dat
// 0 Author: [PTadmin]
// 0 !LDRAW_ORG Part Alias UPDATE 2013-02
// 0 !LICENSE Licensed under CC BY 4.0 : see CAreadme.txt
// 
// 0 BFC CERTIFY CW
  [0,"BFC","CERTIFY"],
  [0,"BFC","CW"],
// 
// 0 !HISTORY 2013-07-21 [PTadmin] Official Update 2013-01
// 0 !HISTORY 2013-12-14 [cwdee] Add = prefix
// 0 !HISTORY 2013-12-23 [PTadmin] Official Update 2013-02
// 
// 
// 0 // Alias of 004659a
// 
// 1 16 0 0 0 1 0 0 0 1 0 0 0 1 004659a.dat
  [1,16,0,0,0,1,0,0,0,1,0,0,0,1, ldraw_lib__004659a()],
// 0
];
module ldraw_lib__004608b(step=0, col=false, unit=2/5, alt=false, line=0.2, solid=!$preview)
    makepoly(ldraw_lib__004608b(), step=step, col=col, unit=unit, alt=alt, line=line, solid=solid);
ldraw_lib__004608b(line=0.2);
// main file
use <../lib.scad>
use <004608b.scad>
use <3004.scad>
function ldraw_lib__3004d0c() = [
// 0 Brick  1 x  2 with Fire Logo Left Sticker
// 0 Name: 3004d0c.dat
// 0 Author: Takeshi Takahashi [RainbowDolphin]
// 0 !LDRAW_ORG Shortcut UPDATE 2024-04
// 0 !LICENSE Licensed under CC BY 4.0 : see CAreadme.txt
// 
// 0 BFC CERTIFY CCW
  [0,"BFC","CERTIFY"],
  [0,"BFC","CCW"],
// 
// 0 !CATEGORY Sticker Shortcut
// 0 !KEYWORDS Bricklink 3004pb170L, Fire engine, Set 672-1
// 
// 0 !HISTORY 2024-05-28 [OrionP] Official Update 2024-04
// 
// 1 16 0 0 0 1 0 0 0 1 0 0 0 1 3004.dat
  [1,16,0,0,0,1,0,0,0,1,0,0,0,1, ldraw_lib__3004()],
// 1 16 -8 12 -10 1 0 0 0 0 -1 0 1 0 004608b.dat
  [1,16,-8,12,-10,1,0,0,0,0,-1,0,1,0, ldraw_lib__004608b()],
];
module ldraw_lib__3004d0c(step=0, col=false, unit=2/5, alt=false, line=0.2, solid=!$preview)
    makepoly(ldraw_lib__3004d0c(), step=step, col=col, unit=unit, alt=alt, line=line, solid=solid);
ldraw_lib__3004d0c(line=0.2);
